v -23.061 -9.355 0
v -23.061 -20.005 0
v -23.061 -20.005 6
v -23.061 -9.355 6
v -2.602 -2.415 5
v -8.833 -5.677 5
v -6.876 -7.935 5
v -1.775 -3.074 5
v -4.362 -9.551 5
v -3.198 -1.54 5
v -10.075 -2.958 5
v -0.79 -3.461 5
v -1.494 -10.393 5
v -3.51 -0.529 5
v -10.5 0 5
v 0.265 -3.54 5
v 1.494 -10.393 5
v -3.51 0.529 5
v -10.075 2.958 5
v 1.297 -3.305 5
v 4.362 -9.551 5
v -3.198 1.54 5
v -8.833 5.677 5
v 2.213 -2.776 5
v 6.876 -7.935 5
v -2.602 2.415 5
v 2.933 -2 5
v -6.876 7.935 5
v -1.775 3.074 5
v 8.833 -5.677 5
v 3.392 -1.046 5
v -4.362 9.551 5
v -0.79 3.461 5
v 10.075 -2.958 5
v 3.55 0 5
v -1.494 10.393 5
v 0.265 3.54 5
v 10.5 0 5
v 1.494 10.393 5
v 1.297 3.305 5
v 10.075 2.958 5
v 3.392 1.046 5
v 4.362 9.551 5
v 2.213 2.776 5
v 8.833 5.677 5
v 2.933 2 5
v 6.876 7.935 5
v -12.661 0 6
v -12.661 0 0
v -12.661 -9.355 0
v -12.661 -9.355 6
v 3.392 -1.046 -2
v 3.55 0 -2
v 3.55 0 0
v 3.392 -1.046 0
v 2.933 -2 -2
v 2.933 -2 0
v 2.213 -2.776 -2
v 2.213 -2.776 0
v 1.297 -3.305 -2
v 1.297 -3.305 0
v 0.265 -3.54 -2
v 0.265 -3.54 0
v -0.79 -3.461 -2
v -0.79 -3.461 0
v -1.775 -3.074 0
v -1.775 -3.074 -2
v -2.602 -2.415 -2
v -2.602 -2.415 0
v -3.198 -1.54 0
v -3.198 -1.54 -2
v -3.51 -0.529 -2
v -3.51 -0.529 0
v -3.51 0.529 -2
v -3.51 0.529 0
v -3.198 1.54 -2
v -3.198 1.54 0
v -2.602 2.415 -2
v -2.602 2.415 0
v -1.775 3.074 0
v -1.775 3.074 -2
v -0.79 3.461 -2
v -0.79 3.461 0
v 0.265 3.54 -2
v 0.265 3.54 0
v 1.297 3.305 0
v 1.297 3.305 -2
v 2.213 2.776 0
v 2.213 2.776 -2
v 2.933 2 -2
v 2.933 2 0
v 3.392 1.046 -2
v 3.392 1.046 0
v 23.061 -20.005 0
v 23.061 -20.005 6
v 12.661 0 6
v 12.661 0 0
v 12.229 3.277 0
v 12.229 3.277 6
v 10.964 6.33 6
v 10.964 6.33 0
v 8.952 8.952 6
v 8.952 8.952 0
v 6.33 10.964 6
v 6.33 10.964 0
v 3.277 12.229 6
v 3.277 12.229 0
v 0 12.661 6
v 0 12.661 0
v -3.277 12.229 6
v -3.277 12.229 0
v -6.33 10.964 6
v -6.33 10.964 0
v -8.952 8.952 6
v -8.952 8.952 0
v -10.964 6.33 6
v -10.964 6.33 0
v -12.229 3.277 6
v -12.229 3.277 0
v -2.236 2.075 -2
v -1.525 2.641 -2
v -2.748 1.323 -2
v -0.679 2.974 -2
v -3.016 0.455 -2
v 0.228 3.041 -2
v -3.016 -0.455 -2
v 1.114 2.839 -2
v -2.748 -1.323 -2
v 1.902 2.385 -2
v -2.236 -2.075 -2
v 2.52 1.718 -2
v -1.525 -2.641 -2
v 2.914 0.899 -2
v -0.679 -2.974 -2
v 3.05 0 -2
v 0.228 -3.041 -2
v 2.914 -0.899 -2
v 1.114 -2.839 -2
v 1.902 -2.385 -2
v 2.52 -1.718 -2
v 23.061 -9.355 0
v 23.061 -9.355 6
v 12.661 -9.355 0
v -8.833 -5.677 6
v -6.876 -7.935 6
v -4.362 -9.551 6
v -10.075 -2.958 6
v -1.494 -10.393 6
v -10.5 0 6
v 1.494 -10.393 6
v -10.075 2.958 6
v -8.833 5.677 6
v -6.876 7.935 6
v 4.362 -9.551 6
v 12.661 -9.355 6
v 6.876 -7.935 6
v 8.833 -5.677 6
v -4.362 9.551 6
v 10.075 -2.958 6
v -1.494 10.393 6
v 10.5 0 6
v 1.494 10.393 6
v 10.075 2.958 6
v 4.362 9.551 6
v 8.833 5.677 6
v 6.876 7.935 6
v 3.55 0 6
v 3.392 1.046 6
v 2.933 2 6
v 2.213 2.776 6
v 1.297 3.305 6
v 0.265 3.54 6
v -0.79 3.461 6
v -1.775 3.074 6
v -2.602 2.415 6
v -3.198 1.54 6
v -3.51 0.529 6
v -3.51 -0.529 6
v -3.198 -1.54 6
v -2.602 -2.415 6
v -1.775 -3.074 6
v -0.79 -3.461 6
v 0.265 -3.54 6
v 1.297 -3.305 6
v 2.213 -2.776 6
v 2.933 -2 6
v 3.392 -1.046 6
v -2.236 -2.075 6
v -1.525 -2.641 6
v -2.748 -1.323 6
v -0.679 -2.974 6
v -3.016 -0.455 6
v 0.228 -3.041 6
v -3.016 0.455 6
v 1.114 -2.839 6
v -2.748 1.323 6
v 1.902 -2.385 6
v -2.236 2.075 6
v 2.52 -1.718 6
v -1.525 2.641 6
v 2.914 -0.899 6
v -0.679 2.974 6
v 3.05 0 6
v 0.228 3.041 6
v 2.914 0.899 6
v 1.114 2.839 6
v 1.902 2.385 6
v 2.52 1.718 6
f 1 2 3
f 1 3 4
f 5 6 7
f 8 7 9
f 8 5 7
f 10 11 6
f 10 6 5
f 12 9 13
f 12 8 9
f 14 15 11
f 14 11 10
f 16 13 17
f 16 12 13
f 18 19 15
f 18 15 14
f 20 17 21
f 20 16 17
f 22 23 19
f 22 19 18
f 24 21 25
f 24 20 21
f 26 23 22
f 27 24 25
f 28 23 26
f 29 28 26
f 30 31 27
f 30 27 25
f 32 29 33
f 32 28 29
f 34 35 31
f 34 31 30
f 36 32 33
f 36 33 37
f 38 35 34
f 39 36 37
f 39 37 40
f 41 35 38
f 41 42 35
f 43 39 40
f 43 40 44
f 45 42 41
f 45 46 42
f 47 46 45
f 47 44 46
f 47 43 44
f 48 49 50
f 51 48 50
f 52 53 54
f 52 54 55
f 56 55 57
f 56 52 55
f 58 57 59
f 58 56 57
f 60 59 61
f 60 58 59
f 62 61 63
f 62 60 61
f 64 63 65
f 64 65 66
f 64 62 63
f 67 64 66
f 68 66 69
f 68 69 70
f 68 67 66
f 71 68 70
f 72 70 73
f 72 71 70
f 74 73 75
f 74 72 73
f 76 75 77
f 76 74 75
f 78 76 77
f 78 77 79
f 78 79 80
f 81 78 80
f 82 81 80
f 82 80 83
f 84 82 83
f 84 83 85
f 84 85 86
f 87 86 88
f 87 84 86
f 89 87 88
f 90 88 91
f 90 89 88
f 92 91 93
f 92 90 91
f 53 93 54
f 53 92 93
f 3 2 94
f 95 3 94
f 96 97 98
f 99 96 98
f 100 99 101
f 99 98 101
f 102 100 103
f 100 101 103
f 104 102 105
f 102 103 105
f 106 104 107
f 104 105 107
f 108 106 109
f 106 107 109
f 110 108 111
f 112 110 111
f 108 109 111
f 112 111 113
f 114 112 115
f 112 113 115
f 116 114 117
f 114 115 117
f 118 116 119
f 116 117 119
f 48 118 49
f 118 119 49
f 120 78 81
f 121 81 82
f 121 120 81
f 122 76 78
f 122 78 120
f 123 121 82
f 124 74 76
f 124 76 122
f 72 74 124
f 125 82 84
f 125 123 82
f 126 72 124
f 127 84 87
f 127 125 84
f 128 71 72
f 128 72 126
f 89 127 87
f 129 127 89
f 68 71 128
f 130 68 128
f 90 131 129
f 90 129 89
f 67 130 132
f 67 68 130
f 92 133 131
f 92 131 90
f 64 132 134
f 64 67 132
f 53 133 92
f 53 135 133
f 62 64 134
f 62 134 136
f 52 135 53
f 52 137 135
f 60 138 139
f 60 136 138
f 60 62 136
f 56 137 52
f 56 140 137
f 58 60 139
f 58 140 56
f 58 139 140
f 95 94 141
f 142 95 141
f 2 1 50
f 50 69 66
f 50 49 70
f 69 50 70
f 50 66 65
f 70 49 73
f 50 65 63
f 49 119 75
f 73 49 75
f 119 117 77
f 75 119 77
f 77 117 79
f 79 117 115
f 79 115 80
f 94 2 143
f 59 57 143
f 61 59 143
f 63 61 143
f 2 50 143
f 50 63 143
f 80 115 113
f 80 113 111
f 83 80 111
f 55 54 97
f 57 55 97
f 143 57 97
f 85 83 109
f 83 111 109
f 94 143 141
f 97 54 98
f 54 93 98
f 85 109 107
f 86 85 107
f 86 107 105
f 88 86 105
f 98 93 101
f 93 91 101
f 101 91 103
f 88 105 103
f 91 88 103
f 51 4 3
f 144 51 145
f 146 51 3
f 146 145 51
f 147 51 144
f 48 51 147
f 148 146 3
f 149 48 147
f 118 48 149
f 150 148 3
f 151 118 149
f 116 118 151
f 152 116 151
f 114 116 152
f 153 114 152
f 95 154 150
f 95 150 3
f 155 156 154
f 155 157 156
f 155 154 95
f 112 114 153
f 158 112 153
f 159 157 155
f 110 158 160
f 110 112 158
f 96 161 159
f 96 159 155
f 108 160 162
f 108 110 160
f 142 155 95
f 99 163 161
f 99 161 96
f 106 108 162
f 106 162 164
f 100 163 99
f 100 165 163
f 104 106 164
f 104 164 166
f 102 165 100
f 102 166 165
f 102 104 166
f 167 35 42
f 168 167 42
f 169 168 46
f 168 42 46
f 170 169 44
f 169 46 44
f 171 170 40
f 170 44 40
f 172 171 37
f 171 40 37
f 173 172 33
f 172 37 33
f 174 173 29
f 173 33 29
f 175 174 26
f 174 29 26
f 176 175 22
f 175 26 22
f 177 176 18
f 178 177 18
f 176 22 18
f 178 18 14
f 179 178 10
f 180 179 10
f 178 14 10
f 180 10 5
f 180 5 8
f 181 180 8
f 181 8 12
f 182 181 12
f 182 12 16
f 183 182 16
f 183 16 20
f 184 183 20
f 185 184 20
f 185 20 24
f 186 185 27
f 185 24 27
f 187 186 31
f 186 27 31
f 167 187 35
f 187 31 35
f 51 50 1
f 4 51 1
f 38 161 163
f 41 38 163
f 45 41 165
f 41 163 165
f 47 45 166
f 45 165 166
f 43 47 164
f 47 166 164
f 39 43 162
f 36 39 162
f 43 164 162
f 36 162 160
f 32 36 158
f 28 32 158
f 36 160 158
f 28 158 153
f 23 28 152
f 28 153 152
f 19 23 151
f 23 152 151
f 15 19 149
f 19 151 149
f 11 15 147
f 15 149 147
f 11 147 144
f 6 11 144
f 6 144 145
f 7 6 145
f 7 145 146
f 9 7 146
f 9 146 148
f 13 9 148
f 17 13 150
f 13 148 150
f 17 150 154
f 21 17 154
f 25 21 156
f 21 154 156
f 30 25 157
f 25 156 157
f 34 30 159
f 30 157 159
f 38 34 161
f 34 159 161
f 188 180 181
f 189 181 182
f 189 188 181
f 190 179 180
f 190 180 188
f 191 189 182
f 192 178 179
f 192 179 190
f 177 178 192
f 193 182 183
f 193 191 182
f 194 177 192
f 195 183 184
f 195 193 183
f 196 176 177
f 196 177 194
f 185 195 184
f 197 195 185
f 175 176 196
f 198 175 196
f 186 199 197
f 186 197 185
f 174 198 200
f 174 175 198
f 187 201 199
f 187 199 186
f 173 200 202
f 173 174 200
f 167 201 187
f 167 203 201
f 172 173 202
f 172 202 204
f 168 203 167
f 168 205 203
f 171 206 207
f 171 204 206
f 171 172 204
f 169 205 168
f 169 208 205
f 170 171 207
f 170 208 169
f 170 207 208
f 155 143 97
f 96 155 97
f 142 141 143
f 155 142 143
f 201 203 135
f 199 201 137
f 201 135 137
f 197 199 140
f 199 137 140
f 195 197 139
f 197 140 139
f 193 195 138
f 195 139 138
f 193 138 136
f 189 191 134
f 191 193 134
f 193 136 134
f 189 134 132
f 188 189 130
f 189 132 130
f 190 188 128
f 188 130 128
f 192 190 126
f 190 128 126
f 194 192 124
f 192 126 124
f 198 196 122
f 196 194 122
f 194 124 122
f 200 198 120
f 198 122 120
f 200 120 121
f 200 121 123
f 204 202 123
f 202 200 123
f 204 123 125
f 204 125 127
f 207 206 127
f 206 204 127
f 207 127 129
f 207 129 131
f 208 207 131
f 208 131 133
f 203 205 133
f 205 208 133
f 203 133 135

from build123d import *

# Parameters (mm, degrees)
SKETCH1_R            = 11
SKETCH1_R_2          = 3
BOSS_EXTRUDE2_DEPTH  = 6
SKETCH3_R            = 10.5
CUT_EXTRUDE1_DEPTH   = 1
SKETCH4_R            = 3.55
BOSS_EXTRUDE5_DEPTH  = 1
SKETCH5_R            = 3.05
CUT_EXTRUDE2_DEPTH   = 17.673332001
BOSS_EXTRUDE6_START  = 2
SKETCH6_R            = 3.55
BOSS_EXTRUDE6_DEPTH  = 2
SKETCH7_R            = 3.05
CUT_EXTRUDE3_DEPTH   = 18.492855685
SKETCH9_R            = 11
BOSS_EXTRUDE9_DEPTH  = 6
SKETCH10_W           = 46.121208306
SKETCH10_H           = 4.65
BOSS_EXTRUDE10_DEPTH = 6


with BuildPart() as part:
    # Sketch1 → Boss-Extrude2 (new body)
    with BuildSketch(Plane.XY):
        Circle(SKETCH1_R)
        Circle(SKETCH1_R_2, mode=Mode.SUBTRACT)
    extrude(amount=BOSS_EXTRUDE2_DEPTH)

    # Sketch3 → Cut-Extrude1 (cut)
    with BuildSketch(Plane.XY.offset(6)):
        Circle(SKETCH3_R)
    extrude(amount=-CUT_EXTRUDE1_DEPTH, mode=Mode.SUBTRACT)

    # Sketch4 → Boss-Extrude5 (add)
    with BuildSketch(Plane.XY.offset(5)):
        Circle(SKETCH4_R)
    extrude(amount=BOSS_EXTRUDE5_DEPTH)

    # Sketch5 → Cut-Extrude2 (cut, through all)
    with BuildSketch(Plane.XY.offset(6)):
        Circle(SKETCH5_R)
    extrude(amount=-CUT_EXTRUDE2_DEPTH, mode=Mode.SUBTRACT)

    # Sketch6 → Boss-Extrude6 (add)
    with BuildSketch(Plane(origin=(0, 0, 0), x_dir=(-1, 0, 0), z_dir=(0, 0, -1)).offset(BOSS_EXTRUDE6_START)):
        with Locations(Location((0, 0, 0), (0, 0, 180))):
            Circle(SKETCH6_R)
    extrude(amount=-BOSS_EXTRUDE6_DEPTH)

    # Sketch7 → Cut-Extrude3 (cut, through all)
    with BuildSketch(Plane(origin=(0, 0, -2), x_dir=(-1, 0, 0), z_dir=(0, 0, -1))):
        with Locations(Location((0, 0, 0), (0, 0, 180))):
            Circle(SKETCH7_R)
    extrude(amount=-CUT_EXTRUDE3_DEPTH, mode=Mode.SUBTRACT)

    # Sketch9 → Boss-Extrude9 (add, through all)
    with BuildSketch(Plane.XY):
        with BuildLine():
            Line((-12.660604153, 0), (-12.660604153, -9.354915786))
            Line((-12.660604153, -9.354915786), (-23.060604153, -9.354915786))
            Line((-23.060604153, -9.354915786), (-23.060604153, -15.354915786))
            Line((-23.060604153, -15.354915786), (23.060604153, -15.354915786))
            Line((23.060604153, -15.354915786), (23.060604153, -9.354915786))
            Line((23.060604153, -9.354915786), (12.660604153, -9.354915786))
            Line((12.660604153, -9.354915786), (12.660604153, 0))
            ThreePointArc((12.660604153, 0), (0, 12.660604153), (-12.660604153, 0))
        make_face()
        Circle(SKETCH9_R, mode=Mode.SUBTRACT)
    extrude(amount=BOSS_EXTRUDE9_DEPTH)

    # Sketch10 → Boss-Extrude10 (add)
    with BuildSketch(Plane.XY):
        with Locations((0, -17.679915786)):
            Rectangle(SKETCH10_W, SKETCH10_H)
    extrude(amount=BOSS_EXTRUDE10_DEPTH)


solid = part.part
